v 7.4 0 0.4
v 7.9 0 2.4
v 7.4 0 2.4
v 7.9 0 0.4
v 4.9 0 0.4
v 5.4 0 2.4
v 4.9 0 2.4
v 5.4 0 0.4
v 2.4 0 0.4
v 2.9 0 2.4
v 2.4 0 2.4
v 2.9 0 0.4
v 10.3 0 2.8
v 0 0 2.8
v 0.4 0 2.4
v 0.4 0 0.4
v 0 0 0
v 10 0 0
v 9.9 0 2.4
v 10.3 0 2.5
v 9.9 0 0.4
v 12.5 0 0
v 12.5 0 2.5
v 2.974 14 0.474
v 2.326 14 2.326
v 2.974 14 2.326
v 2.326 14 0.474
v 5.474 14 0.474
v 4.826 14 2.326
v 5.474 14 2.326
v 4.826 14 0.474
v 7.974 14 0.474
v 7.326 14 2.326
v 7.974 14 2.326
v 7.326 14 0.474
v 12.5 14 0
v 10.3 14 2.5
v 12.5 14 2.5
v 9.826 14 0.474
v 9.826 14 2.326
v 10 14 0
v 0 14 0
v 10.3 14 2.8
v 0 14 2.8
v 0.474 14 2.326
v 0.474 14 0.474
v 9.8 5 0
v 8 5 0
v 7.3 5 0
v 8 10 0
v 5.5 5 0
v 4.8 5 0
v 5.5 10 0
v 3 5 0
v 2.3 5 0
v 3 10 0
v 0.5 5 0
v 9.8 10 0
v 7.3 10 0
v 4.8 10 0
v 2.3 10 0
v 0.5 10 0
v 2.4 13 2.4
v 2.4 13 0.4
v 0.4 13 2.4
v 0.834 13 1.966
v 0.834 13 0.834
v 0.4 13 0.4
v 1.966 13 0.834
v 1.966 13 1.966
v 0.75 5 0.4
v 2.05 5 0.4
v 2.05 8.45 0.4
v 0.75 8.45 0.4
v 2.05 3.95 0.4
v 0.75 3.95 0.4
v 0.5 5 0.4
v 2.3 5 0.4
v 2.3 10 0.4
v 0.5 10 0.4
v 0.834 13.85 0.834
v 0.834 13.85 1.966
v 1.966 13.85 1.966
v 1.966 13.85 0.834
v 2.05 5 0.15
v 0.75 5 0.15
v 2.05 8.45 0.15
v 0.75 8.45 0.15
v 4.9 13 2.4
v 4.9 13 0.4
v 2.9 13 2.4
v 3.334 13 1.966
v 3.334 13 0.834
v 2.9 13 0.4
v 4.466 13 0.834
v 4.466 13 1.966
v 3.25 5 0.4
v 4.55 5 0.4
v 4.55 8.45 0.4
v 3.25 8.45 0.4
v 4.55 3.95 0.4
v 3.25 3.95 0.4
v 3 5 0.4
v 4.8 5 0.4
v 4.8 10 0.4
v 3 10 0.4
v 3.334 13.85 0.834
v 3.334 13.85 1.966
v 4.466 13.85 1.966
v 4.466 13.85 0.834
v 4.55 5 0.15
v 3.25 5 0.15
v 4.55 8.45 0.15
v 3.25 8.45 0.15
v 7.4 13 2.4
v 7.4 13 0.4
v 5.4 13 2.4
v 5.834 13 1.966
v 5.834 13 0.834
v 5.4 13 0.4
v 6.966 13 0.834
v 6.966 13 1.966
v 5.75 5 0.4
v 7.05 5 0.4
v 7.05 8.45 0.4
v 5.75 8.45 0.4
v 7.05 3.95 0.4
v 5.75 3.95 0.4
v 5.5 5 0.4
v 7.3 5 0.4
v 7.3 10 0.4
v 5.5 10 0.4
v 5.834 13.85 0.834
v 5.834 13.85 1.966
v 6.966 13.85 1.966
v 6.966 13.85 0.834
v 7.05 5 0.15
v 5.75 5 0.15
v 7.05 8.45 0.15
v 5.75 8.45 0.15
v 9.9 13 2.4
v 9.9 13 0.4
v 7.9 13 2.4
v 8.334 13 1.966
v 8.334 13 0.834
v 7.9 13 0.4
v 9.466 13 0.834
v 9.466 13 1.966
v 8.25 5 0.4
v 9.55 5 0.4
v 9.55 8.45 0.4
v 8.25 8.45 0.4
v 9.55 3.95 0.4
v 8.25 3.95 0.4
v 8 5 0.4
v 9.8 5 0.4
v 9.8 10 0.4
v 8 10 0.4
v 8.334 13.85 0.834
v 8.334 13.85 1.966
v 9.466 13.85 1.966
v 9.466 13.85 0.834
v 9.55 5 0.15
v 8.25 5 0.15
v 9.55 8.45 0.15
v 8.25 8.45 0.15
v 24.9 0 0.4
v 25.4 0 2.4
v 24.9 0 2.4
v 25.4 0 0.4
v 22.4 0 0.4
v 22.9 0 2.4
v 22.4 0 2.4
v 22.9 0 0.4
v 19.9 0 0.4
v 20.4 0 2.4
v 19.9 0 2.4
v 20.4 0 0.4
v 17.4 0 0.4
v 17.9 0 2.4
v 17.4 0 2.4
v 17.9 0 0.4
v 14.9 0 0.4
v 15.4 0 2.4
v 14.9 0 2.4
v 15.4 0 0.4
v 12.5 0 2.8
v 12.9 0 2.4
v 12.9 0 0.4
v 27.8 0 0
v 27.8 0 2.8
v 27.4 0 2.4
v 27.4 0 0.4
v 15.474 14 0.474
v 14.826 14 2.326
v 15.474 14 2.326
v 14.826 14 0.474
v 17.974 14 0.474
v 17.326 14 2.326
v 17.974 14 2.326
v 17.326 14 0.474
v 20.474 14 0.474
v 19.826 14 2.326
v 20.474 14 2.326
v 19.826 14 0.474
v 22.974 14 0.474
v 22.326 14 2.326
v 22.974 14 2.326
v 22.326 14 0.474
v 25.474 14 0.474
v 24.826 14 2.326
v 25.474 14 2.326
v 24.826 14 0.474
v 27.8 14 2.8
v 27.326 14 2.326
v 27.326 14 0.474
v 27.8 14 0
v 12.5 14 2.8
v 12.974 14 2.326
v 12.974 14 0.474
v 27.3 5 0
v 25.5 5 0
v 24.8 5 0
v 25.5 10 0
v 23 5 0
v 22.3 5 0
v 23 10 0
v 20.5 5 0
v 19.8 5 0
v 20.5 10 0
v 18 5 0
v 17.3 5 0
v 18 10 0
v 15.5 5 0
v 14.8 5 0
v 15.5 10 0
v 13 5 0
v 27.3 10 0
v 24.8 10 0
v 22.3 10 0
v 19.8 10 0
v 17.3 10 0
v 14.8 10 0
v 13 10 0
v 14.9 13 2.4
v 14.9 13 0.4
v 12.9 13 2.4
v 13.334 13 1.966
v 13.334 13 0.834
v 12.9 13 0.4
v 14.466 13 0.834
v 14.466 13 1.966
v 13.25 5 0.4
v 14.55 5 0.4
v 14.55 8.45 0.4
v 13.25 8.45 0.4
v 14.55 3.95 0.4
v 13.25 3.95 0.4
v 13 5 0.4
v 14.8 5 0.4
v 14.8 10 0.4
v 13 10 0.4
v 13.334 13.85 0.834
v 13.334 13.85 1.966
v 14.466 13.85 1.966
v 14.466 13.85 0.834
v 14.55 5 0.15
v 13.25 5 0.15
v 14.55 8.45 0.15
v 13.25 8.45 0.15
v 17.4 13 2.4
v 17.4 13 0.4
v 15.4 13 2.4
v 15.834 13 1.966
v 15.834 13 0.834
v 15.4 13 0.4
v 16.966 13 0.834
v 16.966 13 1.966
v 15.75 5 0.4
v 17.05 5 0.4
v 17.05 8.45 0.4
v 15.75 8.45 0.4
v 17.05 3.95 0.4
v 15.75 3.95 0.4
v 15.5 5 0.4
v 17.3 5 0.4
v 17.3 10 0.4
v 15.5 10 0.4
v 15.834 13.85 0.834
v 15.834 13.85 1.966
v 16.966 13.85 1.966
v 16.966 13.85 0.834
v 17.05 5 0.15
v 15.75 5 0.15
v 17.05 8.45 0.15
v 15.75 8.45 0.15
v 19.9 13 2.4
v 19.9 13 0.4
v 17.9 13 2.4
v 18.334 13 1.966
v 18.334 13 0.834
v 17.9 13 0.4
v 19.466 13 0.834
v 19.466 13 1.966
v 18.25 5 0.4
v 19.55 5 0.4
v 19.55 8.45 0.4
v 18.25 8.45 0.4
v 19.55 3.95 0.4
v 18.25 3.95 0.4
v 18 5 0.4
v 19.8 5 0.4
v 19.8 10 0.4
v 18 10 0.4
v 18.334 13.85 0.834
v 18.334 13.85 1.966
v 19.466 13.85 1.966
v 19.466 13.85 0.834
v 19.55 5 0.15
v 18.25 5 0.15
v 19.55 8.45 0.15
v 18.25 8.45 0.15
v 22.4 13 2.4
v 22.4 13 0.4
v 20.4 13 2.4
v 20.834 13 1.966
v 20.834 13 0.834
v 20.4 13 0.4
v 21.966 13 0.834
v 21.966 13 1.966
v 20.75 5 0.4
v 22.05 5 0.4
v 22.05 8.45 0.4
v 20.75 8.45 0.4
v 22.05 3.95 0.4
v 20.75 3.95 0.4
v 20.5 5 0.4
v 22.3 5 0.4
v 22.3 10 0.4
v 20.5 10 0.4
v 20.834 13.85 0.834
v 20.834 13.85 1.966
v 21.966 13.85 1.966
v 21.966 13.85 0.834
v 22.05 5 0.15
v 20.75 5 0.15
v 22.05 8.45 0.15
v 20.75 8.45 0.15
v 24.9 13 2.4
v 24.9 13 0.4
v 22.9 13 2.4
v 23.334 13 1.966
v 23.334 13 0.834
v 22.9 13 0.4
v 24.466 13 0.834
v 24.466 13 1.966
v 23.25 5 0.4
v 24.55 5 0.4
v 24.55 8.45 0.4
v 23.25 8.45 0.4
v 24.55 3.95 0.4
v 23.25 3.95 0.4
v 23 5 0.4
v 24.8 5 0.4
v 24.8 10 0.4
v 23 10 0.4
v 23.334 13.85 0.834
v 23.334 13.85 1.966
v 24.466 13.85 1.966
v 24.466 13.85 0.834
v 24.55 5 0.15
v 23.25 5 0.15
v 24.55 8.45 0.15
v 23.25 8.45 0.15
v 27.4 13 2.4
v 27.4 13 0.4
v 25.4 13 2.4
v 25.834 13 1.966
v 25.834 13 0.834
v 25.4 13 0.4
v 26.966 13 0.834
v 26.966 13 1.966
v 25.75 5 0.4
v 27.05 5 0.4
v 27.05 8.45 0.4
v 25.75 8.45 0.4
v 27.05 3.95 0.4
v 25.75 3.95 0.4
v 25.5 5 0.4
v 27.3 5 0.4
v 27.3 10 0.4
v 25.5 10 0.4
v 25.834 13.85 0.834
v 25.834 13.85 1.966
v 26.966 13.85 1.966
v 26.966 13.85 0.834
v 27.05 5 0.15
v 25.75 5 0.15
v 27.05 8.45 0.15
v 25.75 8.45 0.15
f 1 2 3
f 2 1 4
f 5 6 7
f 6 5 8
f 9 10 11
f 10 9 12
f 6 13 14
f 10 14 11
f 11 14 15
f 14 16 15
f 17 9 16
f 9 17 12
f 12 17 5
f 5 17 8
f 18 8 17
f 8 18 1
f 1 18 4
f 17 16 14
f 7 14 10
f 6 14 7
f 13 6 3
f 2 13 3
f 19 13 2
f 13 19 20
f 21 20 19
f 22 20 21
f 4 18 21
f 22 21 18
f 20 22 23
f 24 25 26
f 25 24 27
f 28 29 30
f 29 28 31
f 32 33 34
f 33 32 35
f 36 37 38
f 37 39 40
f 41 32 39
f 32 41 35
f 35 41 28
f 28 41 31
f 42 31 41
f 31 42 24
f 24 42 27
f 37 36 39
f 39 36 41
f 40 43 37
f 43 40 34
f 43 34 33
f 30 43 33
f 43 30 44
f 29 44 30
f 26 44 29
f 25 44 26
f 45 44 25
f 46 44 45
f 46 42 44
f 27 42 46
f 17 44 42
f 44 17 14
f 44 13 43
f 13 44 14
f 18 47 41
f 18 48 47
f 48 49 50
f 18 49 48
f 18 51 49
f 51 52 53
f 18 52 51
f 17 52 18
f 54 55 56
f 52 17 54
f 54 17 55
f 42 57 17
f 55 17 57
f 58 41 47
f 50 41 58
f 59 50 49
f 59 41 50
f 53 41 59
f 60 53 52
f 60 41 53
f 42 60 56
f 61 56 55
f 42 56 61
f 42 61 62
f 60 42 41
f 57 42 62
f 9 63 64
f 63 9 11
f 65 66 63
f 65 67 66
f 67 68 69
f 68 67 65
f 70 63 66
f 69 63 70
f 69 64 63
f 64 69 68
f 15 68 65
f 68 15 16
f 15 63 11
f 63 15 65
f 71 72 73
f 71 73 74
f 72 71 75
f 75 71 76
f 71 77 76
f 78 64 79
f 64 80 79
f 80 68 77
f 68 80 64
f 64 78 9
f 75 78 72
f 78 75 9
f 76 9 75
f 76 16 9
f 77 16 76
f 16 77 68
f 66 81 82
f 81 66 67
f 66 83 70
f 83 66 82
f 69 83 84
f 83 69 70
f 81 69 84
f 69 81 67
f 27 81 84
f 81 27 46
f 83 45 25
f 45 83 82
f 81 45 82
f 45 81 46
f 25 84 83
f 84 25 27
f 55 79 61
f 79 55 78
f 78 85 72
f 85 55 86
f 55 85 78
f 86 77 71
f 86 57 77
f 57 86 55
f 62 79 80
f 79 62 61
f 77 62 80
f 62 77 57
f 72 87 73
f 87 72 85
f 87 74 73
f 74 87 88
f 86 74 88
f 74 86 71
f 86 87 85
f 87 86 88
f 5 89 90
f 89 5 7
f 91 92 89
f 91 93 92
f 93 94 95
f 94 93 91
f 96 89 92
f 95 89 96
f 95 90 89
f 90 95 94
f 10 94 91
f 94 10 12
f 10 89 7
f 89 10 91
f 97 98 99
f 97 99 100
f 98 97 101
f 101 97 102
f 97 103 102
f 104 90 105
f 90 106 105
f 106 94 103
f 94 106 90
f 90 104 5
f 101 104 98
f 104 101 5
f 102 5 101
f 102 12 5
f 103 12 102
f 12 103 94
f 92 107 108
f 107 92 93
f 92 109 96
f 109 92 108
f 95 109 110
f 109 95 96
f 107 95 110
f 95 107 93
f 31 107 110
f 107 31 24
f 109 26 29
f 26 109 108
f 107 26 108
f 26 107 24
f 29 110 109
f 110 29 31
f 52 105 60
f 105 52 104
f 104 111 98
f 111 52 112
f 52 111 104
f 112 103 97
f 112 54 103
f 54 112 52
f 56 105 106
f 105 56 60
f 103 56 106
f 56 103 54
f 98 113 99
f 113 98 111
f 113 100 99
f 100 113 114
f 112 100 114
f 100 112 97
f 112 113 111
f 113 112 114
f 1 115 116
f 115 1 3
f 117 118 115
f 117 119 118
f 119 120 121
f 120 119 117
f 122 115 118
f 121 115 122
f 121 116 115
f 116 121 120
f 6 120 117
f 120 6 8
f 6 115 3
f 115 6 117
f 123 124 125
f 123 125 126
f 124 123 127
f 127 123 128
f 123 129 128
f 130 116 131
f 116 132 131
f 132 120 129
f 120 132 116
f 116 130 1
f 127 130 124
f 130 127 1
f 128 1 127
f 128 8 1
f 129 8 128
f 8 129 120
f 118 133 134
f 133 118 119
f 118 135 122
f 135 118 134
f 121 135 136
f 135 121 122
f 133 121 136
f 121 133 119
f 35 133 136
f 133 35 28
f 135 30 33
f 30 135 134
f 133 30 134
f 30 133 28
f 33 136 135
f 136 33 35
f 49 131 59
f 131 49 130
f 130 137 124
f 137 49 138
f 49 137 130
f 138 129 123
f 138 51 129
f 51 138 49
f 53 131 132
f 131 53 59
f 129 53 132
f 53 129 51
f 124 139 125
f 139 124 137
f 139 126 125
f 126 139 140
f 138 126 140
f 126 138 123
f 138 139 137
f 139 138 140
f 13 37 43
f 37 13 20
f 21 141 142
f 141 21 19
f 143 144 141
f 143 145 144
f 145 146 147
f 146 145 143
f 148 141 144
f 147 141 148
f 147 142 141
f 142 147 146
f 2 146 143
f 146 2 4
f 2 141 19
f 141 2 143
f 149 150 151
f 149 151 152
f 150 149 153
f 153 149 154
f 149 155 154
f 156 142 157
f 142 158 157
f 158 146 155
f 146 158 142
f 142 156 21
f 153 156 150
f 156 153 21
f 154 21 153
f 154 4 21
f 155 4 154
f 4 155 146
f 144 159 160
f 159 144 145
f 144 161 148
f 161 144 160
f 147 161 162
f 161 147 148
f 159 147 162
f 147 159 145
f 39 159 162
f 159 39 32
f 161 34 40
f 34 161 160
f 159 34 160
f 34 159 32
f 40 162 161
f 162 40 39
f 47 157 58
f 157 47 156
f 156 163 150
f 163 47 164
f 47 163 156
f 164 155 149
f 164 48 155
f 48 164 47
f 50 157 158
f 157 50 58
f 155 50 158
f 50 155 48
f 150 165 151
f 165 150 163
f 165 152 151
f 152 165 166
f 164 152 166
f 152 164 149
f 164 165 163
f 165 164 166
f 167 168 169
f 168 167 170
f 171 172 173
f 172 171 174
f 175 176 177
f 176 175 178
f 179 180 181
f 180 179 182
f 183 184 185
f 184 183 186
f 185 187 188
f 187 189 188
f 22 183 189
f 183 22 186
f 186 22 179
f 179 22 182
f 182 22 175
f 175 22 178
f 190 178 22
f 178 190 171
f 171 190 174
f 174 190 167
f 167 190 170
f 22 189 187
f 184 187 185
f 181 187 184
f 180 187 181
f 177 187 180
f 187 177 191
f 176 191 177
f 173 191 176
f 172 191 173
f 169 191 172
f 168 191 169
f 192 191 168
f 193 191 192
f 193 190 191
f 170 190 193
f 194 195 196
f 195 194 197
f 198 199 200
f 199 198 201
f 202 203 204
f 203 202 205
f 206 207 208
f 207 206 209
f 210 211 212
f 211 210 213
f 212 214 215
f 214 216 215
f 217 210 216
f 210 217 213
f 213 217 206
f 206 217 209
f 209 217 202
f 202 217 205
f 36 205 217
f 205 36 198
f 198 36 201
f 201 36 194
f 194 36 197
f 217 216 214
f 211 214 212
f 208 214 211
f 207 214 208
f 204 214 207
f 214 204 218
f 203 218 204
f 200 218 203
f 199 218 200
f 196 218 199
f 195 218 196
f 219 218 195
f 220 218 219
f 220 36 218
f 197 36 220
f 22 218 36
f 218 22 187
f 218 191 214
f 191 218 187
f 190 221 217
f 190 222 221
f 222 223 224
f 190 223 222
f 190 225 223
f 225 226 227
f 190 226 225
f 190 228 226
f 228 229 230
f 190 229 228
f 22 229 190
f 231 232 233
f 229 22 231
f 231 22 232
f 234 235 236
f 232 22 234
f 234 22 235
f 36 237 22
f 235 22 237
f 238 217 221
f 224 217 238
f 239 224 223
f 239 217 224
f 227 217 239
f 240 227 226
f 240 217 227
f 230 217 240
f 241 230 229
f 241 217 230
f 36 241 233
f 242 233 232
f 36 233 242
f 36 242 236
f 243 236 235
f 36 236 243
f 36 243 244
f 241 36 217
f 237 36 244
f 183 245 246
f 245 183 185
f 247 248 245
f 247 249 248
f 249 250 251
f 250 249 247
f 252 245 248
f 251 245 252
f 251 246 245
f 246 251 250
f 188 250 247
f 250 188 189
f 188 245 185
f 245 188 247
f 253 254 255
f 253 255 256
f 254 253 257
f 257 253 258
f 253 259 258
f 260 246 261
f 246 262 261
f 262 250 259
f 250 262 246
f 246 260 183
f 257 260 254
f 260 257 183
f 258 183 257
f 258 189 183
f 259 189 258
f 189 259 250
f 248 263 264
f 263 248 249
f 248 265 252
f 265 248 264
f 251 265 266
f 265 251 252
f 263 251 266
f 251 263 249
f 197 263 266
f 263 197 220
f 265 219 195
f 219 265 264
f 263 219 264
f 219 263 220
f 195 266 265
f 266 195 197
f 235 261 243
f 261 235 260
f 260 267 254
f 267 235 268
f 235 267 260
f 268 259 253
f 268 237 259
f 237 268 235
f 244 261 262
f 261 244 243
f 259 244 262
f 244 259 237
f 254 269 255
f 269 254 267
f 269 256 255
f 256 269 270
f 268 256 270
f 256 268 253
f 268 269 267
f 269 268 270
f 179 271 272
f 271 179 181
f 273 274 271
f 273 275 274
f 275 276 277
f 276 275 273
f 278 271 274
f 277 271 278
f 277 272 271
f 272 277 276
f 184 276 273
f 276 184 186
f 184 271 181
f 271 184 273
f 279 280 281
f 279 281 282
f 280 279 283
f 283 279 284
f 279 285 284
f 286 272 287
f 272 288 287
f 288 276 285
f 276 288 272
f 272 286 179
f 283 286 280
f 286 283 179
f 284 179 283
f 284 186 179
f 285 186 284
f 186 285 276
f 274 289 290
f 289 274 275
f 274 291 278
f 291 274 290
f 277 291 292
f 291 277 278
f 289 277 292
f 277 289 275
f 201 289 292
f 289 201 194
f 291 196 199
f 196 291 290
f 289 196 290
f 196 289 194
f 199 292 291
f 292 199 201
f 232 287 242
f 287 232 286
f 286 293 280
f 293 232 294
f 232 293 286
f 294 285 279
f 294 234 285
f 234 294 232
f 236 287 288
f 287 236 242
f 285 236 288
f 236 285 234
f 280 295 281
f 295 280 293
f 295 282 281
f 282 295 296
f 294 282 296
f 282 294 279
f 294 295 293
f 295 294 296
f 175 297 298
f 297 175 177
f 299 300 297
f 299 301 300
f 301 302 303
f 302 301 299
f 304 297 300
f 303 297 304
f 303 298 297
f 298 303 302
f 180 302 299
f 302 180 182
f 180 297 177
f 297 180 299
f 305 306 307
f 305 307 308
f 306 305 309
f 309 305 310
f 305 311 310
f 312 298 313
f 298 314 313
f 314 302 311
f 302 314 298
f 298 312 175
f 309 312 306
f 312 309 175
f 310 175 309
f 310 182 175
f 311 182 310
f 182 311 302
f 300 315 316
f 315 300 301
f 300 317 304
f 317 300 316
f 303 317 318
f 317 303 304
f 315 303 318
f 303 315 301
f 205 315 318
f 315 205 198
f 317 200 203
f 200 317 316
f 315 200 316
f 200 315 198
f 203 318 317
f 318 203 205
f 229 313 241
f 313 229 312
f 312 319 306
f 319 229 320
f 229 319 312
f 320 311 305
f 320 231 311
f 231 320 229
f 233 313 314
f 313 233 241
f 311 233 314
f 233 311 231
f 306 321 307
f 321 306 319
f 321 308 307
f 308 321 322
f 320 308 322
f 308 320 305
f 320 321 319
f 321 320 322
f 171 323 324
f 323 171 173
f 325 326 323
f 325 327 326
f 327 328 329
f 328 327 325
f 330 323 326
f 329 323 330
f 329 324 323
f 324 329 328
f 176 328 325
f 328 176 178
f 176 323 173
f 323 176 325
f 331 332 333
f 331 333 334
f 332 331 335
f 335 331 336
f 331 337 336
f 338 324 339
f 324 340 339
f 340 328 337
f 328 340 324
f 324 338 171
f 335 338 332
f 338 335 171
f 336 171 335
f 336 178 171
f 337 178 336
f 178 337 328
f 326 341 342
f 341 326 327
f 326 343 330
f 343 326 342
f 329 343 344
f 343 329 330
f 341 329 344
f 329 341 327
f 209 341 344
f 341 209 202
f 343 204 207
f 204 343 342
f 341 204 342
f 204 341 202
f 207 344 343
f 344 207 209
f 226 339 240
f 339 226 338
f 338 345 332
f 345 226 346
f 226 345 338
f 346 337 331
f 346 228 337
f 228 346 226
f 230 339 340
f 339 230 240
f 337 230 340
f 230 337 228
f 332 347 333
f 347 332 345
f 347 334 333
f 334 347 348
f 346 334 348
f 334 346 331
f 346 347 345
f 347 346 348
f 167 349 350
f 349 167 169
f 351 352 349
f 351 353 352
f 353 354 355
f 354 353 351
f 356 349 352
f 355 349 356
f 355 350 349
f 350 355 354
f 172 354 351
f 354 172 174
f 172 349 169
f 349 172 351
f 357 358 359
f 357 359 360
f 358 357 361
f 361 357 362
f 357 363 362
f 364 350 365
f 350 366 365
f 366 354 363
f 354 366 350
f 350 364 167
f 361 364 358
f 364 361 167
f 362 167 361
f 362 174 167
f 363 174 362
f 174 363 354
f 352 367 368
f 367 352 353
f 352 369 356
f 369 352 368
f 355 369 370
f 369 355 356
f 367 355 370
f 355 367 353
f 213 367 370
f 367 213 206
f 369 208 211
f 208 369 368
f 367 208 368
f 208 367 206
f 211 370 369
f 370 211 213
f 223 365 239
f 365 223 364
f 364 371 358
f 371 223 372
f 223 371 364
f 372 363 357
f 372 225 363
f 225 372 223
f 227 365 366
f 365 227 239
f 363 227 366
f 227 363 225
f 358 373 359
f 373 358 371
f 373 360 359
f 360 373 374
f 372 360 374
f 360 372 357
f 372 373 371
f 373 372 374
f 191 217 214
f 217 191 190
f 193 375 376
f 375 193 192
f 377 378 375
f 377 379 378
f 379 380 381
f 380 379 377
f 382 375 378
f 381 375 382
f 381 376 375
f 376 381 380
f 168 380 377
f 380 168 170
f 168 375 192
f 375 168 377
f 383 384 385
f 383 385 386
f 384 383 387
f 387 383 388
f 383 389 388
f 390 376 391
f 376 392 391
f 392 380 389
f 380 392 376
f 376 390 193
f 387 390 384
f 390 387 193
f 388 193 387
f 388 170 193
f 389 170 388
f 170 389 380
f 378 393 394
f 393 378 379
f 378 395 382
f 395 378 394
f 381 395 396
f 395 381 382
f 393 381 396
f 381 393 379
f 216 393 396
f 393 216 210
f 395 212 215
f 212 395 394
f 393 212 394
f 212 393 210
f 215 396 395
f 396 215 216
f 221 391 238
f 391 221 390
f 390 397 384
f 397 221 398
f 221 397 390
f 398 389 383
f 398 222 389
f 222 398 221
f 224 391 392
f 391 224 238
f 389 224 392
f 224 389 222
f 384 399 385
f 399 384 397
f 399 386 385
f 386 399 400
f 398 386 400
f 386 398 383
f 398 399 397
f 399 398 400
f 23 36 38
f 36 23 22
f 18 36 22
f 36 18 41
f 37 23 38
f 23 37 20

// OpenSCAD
//the number of "shells" to make
count = 11; // [1:10]
solid = 4;
module shell() {
    translate([2.8/2, 7, 2.8/2]) 
    rotate([90, 0, 0])
    union() {
        difference() {
            cube([2.8, 2.8, 14], center=true);
            // inner hole/hollow
            translate([0, 0, 1])
                cube([2, 2, 14], center=true);
            // pin hole
            rotate([0, 0, 45])
                cylinder(r=0.8, h=60, center=true, $fn=4);
            // chamfer
            translate([0, 0, -7.1]) rotate([0, 0, 45]) 
                cylinder(r1=2.5, r2=0.8, h=0.5, center=true, $fn=4);
            // tab hole 
            translate([0, -1, -0.5])
            cube([1.8, 1, 5], center=true);
        }
        // tab
         translate([0, -1.125, 0.8])
            cube([1.3, 0.25, 4.5], center=true);
    }
}

module shellx() {
    translate([2.5/2, 7, 2.5/2]) 
    rotate([90, 0, 0])
           cube([2.5, 2.5, 14], center=true);
};

 for(i = [0:count-1]) 
    translate([2.5*i, 0, 0]) 
     if (i==solid) shellx(); else   shell();
     
